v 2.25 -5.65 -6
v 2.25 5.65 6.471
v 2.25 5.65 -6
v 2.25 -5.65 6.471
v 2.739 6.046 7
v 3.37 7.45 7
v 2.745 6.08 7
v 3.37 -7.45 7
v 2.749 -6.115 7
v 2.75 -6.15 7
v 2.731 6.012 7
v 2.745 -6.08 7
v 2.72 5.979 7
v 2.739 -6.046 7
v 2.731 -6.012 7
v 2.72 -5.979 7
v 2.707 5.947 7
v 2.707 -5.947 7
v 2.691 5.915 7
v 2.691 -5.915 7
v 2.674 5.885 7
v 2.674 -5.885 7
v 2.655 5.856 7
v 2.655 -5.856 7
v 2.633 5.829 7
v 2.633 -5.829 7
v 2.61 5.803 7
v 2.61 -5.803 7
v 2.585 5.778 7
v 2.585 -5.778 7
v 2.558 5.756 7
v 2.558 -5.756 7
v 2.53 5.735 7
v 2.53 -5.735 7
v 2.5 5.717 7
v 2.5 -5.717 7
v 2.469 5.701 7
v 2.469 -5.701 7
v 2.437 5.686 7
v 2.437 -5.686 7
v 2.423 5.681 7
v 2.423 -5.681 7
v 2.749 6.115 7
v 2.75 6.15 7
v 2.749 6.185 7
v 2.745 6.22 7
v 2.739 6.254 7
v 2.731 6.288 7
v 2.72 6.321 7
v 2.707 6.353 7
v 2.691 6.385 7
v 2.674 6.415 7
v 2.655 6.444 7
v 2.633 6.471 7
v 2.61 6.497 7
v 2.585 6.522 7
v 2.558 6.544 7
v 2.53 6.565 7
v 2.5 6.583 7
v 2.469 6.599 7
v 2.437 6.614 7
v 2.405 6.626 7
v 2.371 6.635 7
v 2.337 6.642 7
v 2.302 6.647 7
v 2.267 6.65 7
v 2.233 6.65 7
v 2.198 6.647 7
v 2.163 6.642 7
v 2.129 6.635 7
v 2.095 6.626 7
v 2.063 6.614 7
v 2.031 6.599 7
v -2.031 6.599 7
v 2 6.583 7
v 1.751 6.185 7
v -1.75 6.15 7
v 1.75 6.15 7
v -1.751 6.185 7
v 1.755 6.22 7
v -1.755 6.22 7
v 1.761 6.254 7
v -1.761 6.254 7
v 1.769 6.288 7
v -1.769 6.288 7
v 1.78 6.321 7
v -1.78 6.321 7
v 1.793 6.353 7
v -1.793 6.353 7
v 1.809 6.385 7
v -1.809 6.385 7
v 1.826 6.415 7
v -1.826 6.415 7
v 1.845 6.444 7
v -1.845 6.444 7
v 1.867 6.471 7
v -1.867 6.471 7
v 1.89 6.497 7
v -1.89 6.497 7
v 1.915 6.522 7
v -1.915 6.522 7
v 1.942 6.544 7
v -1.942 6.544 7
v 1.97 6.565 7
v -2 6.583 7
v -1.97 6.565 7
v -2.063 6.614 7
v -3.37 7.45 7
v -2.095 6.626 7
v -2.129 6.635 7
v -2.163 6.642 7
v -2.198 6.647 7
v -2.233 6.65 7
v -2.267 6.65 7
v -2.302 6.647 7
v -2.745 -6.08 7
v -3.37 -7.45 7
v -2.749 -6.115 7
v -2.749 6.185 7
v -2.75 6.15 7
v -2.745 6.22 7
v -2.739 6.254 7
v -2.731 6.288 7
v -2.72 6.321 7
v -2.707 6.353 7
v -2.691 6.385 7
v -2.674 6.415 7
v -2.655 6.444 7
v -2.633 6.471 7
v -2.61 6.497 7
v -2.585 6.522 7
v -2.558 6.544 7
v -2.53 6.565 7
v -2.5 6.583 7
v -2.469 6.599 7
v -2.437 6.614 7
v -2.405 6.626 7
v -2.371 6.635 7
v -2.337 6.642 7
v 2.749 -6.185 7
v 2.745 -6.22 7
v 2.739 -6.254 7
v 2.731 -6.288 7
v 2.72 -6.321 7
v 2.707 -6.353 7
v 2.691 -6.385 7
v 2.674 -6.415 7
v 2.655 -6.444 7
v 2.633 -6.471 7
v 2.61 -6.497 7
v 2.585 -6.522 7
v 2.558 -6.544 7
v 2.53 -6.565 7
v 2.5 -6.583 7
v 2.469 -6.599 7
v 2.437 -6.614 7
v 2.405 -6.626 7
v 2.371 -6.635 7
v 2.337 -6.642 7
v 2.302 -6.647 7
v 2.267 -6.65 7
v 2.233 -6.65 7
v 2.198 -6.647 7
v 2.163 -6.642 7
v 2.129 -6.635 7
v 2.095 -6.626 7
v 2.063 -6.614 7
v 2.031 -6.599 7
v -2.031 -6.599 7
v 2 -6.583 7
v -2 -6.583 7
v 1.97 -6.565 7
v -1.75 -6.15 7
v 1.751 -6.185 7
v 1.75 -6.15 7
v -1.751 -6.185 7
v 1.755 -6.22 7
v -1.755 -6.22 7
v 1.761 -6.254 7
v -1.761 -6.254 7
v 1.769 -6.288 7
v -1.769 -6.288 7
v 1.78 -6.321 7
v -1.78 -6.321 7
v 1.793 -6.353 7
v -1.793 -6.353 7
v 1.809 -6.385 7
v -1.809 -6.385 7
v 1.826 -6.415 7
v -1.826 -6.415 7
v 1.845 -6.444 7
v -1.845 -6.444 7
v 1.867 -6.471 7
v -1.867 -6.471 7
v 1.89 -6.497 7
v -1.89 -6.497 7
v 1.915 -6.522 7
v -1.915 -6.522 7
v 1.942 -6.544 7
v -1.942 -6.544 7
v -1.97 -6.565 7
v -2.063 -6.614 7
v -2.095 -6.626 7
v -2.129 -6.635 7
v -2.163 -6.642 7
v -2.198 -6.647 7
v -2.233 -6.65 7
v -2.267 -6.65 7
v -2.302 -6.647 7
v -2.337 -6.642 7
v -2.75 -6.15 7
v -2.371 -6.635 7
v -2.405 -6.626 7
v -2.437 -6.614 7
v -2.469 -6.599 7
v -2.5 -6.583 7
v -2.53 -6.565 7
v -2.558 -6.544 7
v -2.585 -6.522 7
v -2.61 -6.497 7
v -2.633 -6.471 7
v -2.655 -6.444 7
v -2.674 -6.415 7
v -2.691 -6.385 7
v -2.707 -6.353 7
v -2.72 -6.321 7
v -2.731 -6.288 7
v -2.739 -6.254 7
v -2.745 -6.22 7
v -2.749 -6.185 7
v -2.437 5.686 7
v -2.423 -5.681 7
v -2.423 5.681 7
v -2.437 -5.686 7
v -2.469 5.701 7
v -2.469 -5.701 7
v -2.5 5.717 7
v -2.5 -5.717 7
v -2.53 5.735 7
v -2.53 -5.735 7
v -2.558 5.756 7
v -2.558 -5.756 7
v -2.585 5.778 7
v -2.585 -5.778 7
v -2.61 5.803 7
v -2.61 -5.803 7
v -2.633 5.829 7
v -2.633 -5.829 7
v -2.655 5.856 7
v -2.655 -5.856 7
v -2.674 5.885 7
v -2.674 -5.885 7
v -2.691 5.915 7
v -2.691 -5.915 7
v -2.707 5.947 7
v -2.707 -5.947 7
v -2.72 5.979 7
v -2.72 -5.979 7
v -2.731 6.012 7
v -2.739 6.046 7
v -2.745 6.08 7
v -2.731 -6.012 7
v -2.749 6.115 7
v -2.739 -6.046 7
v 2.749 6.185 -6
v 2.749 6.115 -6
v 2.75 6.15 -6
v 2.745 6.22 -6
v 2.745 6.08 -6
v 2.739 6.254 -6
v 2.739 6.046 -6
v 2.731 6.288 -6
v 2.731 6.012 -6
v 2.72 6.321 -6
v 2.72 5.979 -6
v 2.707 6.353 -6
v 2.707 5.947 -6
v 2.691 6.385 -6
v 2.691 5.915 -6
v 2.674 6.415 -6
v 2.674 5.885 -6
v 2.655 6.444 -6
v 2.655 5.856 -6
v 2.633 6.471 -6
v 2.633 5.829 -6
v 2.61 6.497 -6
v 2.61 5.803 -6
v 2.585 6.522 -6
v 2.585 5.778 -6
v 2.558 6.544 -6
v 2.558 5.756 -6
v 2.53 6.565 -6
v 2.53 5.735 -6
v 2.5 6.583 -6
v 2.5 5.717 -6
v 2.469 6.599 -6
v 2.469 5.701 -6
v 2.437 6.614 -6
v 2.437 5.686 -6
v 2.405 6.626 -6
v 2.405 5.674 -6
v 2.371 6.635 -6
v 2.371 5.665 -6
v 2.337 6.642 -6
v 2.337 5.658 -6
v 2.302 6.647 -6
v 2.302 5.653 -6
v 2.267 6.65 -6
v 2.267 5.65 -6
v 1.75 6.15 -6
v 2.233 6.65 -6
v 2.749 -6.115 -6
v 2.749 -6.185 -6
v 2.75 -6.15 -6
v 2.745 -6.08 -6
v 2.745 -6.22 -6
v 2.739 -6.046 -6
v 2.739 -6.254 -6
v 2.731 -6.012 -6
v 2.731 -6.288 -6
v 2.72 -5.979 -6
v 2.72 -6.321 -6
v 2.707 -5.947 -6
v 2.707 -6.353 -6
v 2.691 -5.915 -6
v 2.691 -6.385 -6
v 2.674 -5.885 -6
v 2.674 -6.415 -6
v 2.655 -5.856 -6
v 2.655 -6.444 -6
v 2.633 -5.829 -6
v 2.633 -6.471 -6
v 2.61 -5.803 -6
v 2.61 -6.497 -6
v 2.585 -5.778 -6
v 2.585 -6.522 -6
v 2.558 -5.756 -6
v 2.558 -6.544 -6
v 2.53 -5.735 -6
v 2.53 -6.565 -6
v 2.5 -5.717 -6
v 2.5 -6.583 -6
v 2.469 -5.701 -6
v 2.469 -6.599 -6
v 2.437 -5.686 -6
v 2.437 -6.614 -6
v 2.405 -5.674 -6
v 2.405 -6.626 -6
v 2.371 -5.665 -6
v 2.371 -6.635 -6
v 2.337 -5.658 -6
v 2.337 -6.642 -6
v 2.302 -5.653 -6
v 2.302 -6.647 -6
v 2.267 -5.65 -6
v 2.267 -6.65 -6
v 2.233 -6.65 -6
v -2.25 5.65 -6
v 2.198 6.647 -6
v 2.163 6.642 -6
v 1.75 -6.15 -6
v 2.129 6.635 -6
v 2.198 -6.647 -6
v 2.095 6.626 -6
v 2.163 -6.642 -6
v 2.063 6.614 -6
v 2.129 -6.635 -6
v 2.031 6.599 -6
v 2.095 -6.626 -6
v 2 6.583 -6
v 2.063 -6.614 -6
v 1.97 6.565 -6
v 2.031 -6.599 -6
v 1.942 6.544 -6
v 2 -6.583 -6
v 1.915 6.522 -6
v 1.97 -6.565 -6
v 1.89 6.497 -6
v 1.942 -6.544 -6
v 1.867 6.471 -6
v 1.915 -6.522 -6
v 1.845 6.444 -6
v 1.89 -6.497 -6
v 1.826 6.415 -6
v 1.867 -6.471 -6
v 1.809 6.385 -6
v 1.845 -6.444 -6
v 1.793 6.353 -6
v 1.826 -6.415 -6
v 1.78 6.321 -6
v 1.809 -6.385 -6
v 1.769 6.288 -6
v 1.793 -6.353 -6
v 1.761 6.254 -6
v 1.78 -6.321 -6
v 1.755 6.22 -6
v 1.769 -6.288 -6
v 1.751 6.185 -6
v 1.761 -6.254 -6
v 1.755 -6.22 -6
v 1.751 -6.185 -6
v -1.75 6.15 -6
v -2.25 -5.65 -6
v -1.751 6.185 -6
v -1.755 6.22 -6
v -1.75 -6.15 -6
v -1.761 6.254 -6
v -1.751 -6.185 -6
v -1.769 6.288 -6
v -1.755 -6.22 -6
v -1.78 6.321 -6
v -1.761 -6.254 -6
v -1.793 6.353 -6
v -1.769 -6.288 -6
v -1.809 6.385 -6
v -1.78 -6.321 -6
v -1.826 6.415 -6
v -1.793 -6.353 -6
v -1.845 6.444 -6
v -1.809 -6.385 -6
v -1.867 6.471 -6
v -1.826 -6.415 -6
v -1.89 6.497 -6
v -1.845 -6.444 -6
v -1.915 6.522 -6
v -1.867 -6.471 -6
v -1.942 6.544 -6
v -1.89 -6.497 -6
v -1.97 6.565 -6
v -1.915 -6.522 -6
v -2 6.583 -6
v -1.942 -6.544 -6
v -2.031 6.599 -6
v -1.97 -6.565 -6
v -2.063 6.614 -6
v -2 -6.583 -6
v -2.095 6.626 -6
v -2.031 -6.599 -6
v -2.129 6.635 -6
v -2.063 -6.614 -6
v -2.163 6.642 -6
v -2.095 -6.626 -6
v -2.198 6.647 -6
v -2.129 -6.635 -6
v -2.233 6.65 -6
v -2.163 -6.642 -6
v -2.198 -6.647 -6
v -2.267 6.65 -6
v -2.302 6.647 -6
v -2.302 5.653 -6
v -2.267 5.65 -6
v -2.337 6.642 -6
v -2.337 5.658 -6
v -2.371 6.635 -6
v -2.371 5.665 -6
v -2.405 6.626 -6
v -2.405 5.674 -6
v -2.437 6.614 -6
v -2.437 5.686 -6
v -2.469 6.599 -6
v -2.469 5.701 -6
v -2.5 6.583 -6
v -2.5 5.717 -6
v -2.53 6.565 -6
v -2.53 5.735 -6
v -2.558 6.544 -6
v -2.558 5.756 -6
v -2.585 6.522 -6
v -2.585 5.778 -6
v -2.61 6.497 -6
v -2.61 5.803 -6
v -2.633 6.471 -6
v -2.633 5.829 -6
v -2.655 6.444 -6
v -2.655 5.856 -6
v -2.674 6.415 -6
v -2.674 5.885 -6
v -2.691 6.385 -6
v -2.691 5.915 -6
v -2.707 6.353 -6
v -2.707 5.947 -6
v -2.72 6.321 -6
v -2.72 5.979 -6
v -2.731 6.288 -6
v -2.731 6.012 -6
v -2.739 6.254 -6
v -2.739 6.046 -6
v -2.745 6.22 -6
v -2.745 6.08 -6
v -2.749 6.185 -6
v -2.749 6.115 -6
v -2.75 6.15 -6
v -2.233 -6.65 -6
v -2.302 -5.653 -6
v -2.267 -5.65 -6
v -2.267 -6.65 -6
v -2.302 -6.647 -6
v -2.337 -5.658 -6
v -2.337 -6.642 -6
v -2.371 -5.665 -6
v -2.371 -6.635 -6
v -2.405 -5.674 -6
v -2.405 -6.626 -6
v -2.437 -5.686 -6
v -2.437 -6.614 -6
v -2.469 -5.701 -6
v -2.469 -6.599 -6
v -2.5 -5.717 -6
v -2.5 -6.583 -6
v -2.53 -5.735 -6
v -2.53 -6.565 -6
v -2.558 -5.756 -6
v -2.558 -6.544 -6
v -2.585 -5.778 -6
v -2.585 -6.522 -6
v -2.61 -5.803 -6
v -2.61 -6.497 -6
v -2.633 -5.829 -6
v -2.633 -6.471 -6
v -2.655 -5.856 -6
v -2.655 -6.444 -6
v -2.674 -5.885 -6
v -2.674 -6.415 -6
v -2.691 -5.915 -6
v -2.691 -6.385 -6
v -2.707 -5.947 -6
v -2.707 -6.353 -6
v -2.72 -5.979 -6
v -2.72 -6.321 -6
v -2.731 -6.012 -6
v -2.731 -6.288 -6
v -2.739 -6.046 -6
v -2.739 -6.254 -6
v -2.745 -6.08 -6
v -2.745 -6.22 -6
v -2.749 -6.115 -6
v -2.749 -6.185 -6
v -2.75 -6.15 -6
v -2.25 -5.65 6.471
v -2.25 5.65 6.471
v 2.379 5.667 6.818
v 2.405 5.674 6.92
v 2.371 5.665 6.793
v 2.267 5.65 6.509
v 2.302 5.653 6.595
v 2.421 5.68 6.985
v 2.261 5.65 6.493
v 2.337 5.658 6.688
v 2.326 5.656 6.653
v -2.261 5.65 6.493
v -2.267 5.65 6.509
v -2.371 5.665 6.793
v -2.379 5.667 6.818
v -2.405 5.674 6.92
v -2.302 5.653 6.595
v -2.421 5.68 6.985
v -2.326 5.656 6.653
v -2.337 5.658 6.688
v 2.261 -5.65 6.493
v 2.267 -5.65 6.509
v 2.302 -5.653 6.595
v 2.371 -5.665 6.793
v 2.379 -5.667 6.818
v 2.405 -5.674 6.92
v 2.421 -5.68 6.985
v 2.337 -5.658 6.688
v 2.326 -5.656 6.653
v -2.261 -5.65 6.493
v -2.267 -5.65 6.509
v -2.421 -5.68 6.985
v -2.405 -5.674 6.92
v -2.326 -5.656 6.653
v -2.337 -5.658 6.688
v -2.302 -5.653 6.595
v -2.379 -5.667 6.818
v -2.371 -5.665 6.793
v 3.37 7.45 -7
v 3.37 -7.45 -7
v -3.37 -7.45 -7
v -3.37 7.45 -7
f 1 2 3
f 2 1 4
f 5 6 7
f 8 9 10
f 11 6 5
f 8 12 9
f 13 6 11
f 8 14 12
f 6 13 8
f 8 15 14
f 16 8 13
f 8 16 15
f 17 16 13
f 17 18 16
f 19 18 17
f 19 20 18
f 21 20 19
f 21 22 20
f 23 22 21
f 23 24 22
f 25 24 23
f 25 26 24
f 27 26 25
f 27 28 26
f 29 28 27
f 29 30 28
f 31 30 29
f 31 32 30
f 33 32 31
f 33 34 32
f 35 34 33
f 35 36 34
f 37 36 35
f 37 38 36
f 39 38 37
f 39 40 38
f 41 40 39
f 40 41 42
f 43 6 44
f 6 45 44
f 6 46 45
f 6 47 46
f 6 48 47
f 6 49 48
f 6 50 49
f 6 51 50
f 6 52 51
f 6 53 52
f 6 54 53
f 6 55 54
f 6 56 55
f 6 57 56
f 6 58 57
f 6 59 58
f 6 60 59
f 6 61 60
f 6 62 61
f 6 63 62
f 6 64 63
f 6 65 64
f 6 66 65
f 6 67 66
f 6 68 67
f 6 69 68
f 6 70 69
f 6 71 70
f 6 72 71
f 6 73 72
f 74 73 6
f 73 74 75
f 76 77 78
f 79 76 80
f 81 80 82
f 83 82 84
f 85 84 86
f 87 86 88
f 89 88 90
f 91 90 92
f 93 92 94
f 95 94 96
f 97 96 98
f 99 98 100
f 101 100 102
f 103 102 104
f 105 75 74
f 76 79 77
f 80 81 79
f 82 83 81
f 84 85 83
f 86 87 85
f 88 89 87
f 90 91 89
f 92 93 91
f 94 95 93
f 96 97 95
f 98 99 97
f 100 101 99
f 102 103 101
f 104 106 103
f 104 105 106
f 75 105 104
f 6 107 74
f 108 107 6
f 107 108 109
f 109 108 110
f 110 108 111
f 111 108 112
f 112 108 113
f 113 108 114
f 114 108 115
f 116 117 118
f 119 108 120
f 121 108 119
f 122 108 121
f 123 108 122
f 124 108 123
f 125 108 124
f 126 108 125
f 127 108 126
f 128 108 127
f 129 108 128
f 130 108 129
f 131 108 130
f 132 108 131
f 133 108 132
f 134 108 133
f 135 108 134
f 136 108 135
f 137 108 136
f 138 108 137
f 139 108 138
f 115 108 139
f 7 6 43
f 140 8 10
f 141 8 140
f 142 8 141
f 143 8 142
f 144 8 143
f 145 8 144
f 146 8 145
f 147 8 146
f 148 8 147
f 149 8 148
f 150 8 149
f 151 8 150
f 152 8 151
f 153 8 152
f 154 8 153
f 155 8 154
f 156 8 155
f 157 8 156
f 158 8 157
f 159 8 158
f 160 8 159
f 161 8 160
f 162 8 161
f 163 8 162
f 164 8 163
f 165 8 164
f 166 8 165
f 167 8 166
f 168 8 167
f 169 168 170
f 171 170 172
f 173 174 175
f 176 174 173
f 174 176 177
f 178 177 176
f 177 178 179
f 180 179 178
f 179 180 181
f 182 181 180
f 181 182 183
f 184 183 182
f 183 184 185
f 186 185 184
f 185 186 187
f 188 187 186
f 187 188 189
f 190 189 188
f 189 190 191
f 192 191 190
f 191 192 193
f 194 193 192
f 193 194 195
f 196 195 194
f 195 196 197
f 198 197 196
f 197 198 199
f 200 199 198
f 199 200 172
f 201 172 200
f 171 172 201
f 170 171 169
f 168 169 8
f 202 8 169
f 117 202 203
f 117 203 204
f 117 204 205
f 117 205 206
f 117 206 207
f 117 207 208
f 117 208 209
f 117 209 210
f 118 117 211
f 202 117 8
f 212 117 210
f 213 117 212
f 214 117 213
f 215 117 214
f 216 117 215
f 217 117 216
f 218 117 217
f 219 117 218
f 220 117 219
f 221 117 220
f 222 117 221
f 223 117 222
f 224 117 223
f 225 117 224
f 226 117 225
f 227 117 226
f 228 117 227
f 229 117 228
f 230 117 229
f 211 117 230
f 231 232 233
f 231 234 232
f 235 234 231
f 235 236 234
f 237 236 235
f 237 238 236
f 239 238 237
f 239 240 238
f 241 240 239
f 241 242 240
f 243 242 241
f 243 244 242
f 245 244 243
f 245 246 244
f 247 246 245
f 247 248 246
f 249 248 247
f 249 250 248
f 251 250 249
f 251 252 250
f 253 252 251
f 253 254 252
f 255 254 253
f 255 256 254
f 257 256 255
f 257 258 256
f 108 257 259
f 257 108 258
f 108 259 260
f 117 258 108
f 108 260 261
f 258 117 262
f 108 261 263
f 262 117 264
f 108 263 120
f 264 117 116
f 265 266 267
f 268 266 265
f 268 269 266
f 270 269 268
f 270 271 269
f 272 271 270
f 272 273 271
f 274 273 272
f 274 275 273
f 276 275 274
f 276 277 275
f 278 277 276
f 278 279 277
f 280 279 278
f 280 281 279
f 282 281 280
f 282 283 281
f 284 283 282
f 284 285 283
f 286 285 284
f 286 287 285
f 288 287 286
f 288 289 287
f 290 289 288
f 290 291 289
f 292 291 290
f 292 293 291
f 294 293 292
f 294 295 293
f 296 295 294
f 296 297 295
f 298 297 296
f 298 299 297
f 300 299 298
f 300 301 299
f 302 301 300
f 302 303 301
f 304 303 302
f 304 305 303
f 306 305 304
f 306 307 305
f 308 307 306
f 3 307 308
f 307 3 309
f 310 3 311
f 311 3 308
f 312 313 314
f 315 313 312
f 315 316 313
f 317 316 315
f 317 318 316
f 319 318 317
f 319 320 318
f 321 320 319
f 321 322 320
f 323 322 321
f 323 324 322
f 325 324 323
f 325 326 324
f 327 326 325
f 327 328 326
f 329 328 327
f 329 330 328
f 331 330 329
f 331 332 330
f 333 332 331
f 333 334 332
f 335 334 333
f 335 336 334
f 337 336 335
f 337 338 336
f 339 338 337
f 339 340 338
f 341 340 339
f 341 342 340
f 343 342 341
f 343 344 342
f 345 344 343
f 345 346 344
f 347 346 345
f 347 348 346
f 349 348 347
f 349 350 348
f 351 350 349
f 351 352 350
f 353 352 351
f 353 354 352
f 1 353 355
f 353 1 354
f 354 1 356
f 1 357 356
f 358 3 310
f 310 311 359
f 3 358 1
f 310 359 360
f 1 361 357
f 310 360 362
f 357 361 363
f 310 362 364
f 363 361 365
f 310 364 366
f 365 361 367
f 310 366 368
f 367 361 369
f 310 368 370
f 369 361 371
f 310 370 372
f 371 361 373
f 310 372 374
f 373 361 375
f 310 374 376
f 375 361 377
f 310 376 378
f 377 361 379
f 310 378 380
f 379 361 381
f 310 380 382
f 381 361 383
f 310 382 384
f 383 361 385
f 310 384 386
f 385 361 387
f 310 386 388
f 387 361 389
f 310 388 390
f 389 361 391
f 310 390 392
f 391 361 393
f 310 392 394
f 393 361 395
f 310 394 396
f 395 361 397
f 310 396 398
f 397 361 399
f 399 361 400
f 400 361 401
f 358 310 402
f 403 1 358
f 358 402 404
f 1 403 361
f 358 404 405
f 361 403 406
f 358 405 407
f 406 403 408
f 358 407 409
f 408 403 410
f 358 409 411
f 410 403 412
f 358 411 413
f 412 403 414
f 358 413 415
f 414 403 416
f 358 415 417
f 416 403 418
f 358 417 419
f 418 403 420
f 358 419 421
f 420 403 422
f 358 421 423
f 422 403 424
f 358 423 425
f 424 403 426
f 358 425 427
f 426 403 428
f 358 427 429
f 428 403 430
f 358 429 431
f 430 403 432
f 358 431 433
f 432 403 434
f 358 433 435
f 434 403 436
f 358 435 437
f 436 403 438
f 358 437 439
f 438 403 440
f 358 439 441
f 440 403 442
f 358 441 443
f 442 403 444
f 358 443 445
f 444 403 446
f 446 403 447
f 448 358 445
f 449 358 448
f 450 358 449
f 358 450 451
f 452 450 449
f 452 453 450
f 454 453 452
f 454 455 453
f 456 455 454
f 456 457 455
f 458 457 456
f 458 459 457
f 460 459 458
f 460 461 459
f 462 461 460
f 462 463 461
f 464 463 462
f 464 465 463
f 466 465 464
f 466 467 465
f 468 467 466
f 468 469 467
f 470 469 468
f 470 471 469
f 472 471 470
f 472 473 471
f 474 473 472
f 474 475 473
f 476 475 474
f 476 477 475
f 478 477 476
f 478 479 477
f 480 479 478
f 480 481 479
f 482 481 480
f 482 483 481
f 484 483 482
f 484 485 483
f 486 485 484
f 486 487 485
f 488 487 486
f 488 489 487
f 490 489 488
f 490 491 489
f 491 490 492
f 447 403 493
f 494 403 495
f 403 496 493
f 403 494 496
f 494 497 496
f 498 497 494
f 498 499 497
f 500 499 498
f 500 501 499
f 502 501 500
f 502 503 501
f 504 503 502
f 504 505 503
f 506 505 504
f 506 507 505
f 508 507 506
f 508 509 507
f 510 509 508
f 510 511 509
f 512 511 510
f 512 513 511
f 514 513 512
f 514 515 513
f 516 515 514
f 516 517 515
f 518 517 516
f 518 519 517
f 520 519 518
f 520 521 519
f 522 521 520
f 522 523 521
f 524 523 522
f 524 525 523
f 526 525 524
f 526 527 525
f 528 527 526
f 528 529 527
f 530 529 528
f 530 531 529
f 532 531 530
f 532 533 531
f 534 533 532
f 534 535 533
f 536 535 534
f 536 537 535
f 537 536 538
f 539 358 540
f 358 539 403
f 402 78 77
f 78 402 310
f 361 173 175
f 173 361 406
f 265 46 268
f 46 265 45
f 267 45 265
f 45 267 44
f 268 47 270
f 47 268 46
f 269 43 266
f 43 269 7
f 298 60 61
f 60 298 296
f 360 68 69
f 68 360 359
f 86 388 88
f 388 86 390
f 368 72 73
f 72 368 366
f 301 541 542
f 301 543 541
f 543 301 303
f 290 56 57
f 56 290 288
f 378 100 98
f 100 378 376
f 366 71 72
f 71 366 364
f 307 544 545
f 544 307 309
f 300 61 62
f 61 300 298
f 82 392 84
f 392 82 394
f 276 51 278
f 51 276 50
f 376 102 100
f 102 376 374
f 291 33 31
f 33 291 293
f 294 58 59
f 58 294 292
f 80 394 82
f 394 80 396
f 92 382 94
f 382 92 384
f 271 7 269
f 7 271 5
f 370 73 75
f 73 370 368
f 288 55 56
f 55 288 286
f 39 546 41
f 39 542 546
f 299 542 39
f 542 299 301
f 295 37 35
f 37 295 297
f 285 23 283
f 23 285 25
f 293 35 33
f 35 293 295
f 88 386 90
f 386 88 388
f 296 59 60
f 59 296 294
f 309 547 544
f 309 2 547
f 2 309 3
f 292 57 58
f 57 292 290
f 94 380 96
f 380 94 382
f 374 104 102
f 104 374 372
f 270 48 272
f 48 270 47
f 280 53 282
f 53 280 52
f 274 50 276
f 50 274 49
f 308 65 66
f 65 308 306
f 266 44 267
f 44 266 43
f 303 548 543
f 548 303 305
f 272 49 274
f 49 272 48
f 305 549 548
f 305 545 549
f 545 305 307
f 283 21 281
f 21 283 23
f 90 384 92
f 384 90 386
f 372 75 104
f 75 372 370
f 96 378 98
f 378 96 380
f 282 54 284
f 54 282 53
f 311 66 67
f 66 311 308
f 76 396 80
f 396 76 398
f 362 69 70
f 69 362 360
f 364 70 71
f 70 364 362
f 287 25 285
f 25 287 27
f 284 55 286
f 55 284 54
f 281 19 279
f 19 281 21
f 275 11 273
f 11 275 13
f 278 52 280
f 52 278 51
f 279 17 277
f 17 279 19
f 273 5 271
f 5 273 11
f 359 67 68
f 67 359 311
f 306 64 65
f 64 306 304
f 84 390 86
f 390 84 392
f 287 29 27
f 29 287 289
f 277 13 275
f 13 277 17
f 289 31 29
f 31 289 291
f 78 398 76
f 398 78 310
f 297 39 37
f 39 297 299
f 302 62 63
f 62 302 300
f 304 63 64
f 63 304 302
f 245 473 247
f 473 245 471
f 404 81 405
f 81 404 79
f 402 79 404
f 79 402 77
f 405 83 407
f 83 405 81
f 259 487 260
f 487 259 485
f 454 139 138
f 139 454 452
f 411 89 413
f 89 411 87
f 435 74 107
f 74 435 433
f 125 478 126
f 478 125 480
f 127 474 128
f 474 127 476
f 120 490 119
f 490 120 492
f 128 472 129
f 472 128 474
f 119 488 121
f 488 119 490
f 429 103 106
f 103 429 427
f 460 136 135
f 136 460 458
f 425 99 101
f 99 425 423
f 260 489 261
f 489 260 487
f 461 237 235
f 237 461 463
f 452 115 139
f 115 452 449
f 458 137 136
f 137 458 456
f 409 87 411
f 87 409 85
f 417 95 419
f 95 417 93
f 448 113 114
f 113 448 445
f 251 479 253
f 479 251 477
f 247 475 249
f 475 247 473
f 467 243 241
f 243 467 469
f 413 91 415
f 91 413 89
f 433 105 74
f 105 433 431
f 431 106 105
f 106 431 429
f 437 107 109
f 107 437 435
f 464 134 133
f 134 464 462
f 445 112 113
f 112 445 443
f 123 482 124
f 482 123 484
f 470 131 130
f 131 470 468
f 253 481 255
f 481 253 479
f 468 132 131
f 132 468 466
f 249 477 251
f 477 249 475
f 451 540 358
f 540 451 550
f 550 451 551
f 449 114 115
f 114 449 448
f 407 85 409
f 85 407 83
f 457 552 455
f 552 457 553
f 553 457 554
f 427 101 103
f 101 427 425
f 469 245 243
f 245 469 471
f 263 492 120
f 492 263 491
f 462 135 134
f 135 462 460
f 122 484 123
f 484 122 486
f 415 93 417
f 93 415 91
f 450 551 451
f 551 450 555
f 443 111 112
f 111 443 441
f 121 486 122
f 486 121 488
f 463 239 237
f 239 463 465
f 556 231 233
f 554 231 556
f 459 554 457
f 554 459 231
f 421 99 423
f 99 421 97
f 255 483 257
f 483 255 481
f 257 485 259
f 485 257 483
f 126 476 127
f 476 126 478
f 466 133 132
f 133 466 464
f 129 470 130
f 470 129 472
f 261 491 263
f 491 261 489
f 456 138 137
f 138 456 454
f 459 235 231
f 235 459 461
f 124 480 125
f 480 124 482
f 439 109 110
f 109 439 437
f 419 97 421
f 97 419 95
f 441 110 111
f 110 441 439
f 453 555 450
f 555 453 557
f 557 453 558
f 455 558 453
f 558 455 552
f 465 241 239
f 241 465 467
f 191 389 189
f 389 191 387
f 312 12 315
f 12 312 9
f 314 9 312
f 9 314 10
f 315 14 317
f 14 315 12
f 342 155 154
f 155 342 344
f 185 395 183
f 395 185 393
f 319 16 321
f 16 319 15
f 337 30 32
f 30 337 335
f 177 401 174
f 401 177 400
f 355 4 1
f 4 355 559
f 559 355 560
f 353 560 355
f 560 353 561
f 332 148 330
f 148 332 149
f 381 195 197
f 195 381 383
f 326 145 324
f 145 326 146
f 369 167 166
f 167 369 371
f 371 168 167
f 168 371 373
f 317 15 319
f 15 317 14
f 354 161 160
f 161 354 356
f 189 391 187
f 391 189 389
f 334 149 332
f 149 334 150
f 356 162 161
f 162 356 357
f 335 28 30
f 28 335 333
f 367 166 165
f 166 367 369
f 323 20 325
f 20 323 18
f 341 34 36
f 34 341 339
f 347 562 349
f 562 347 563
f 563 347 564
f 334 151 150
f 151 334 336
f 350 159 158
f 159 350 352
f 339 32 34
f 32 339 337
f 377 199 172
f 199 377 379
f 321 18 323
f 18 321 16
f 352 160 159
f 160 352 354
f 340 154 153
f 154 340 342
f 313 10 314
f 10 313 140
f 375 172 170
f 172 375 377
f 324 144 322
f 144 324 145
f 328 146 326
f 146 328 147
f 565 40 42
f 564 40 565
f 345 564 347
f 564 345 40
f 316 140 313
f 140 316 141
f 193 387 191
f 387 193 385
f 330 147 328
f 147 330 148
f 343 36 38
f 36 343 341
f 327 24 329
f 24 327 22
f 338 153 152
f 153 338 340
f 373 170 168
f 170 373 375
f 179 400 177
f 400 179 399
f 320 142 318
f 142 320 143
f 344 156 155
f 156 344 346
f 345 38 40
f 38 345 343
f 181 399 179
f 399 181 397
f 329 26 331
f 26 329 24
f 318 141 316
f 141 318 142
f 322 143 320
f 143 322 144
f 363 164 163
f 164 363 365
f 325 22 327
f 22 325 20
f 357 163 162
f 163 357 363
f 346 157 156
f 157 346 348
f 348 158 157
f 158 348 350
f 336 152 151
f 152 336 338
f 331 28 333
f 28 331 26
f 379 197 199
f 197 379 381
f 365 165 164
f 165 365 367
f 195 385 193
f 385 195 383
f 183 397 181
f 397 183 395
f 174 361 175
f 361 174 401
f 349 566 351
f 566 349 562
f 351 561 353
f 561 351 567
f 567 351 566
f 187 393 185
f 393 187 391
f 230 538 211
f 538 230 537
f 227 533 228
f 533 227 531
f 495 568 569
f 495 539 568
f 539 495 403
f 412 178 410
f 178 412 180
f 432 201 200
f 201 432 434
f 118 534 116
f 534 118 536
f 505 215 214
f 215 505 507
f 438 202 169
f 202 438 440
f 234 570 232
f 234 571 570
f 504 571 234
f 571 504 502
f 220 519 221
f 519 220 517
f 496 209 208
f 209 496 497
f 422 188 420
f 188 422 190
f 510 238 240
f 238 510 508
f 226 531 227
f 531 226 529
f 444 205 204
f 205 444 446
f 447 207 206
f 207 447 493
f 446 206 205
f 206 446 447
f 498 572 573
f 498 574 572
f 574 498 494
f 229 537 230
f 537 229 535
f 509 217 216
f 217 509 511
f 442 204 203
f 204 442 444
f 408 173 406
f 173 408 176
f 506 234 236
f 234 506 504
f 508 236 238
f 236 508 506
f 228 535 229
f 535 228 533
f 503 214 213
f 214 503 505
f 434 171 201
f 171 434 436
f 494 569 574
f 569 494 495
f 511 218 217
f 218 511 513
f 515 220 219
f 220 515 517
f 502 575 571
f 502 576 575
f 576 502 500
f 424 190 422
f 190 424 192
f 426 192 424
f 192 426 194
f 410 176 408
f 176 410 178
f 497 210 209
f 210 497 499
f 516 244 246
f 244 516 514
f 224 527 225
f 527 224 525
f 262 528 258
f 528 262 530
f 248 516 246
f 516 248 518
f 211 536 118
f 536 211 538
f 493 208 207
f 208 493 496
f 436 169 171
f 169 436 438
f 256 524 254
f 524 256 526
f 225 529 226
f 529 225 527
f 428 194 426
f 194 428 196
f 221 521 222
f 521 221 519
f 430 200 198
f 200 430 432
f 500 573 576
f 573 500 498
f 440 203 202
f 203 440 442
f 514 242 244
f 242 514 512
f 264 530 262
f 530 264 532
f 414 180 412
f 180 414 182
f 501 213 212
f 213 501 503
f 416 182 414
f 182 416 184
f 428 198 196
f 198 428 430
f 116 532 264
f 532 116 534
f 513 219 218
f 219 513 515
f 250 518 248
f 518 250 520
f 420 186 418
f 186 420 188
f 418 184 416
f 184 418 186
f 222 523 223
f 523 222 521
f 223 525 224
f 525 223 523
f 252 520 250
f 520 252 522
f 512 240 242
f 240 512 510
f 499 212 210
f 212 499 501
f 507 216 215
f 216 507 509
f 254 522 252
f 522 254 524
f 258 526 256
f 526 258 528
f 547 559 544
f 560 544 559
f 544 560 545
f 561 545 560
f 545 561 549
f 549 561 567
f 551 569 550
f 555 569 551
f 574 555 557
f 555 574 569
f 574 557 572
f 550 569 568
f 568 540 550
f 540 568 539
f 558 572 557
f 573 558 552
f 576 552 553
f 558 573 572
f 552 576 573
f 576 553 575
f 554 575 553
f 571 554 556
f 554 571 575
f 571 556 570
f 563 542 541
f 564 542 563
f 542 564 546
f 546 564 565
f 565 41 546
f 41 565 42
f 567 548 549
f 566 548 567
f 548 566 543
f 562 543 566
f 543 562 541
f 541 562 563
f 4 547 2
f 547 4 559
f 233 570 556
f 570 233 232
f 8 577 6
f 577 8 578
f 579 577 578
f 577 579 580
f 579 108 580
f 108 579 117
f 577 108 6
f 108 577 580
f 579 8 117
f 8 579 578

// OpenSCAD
$fn=90;

heightOutside = 14;
heightInside = 13;
widthInside = 4.5;
lengthInside = 12.3;
difference(){
	cube([6.74, 14.9, heightOutside], center=true);
	translate([0, 0, (heightOutside-heightInside)/2]){
		#cube([widthInside, lengthInside, heightInside], center=true);
		translate([widthInside/2, lengthInside/2, 0])
			#cylinder(d=1, h=heightInside, center=true);
		translate([-widthInside/2, lengthInside/2, 0])
			#cylinder(d=1, h=heightInside, center=true);
		translate([widthInside/2, -lengthInside/2, 0])
			#cylinder(d=1, h=heightInside, center=true);
		translate([-widthInside/2, -lengthInside/2, 0])
			#cylinder(d=1, h=heightInside, center=true);
		translate([0, 0, heightOutside/2])
			rotate([90, 0, 0])
				#cylinder(d=1.1*widthInside, h=lengthInside, center=true);
	}
}
